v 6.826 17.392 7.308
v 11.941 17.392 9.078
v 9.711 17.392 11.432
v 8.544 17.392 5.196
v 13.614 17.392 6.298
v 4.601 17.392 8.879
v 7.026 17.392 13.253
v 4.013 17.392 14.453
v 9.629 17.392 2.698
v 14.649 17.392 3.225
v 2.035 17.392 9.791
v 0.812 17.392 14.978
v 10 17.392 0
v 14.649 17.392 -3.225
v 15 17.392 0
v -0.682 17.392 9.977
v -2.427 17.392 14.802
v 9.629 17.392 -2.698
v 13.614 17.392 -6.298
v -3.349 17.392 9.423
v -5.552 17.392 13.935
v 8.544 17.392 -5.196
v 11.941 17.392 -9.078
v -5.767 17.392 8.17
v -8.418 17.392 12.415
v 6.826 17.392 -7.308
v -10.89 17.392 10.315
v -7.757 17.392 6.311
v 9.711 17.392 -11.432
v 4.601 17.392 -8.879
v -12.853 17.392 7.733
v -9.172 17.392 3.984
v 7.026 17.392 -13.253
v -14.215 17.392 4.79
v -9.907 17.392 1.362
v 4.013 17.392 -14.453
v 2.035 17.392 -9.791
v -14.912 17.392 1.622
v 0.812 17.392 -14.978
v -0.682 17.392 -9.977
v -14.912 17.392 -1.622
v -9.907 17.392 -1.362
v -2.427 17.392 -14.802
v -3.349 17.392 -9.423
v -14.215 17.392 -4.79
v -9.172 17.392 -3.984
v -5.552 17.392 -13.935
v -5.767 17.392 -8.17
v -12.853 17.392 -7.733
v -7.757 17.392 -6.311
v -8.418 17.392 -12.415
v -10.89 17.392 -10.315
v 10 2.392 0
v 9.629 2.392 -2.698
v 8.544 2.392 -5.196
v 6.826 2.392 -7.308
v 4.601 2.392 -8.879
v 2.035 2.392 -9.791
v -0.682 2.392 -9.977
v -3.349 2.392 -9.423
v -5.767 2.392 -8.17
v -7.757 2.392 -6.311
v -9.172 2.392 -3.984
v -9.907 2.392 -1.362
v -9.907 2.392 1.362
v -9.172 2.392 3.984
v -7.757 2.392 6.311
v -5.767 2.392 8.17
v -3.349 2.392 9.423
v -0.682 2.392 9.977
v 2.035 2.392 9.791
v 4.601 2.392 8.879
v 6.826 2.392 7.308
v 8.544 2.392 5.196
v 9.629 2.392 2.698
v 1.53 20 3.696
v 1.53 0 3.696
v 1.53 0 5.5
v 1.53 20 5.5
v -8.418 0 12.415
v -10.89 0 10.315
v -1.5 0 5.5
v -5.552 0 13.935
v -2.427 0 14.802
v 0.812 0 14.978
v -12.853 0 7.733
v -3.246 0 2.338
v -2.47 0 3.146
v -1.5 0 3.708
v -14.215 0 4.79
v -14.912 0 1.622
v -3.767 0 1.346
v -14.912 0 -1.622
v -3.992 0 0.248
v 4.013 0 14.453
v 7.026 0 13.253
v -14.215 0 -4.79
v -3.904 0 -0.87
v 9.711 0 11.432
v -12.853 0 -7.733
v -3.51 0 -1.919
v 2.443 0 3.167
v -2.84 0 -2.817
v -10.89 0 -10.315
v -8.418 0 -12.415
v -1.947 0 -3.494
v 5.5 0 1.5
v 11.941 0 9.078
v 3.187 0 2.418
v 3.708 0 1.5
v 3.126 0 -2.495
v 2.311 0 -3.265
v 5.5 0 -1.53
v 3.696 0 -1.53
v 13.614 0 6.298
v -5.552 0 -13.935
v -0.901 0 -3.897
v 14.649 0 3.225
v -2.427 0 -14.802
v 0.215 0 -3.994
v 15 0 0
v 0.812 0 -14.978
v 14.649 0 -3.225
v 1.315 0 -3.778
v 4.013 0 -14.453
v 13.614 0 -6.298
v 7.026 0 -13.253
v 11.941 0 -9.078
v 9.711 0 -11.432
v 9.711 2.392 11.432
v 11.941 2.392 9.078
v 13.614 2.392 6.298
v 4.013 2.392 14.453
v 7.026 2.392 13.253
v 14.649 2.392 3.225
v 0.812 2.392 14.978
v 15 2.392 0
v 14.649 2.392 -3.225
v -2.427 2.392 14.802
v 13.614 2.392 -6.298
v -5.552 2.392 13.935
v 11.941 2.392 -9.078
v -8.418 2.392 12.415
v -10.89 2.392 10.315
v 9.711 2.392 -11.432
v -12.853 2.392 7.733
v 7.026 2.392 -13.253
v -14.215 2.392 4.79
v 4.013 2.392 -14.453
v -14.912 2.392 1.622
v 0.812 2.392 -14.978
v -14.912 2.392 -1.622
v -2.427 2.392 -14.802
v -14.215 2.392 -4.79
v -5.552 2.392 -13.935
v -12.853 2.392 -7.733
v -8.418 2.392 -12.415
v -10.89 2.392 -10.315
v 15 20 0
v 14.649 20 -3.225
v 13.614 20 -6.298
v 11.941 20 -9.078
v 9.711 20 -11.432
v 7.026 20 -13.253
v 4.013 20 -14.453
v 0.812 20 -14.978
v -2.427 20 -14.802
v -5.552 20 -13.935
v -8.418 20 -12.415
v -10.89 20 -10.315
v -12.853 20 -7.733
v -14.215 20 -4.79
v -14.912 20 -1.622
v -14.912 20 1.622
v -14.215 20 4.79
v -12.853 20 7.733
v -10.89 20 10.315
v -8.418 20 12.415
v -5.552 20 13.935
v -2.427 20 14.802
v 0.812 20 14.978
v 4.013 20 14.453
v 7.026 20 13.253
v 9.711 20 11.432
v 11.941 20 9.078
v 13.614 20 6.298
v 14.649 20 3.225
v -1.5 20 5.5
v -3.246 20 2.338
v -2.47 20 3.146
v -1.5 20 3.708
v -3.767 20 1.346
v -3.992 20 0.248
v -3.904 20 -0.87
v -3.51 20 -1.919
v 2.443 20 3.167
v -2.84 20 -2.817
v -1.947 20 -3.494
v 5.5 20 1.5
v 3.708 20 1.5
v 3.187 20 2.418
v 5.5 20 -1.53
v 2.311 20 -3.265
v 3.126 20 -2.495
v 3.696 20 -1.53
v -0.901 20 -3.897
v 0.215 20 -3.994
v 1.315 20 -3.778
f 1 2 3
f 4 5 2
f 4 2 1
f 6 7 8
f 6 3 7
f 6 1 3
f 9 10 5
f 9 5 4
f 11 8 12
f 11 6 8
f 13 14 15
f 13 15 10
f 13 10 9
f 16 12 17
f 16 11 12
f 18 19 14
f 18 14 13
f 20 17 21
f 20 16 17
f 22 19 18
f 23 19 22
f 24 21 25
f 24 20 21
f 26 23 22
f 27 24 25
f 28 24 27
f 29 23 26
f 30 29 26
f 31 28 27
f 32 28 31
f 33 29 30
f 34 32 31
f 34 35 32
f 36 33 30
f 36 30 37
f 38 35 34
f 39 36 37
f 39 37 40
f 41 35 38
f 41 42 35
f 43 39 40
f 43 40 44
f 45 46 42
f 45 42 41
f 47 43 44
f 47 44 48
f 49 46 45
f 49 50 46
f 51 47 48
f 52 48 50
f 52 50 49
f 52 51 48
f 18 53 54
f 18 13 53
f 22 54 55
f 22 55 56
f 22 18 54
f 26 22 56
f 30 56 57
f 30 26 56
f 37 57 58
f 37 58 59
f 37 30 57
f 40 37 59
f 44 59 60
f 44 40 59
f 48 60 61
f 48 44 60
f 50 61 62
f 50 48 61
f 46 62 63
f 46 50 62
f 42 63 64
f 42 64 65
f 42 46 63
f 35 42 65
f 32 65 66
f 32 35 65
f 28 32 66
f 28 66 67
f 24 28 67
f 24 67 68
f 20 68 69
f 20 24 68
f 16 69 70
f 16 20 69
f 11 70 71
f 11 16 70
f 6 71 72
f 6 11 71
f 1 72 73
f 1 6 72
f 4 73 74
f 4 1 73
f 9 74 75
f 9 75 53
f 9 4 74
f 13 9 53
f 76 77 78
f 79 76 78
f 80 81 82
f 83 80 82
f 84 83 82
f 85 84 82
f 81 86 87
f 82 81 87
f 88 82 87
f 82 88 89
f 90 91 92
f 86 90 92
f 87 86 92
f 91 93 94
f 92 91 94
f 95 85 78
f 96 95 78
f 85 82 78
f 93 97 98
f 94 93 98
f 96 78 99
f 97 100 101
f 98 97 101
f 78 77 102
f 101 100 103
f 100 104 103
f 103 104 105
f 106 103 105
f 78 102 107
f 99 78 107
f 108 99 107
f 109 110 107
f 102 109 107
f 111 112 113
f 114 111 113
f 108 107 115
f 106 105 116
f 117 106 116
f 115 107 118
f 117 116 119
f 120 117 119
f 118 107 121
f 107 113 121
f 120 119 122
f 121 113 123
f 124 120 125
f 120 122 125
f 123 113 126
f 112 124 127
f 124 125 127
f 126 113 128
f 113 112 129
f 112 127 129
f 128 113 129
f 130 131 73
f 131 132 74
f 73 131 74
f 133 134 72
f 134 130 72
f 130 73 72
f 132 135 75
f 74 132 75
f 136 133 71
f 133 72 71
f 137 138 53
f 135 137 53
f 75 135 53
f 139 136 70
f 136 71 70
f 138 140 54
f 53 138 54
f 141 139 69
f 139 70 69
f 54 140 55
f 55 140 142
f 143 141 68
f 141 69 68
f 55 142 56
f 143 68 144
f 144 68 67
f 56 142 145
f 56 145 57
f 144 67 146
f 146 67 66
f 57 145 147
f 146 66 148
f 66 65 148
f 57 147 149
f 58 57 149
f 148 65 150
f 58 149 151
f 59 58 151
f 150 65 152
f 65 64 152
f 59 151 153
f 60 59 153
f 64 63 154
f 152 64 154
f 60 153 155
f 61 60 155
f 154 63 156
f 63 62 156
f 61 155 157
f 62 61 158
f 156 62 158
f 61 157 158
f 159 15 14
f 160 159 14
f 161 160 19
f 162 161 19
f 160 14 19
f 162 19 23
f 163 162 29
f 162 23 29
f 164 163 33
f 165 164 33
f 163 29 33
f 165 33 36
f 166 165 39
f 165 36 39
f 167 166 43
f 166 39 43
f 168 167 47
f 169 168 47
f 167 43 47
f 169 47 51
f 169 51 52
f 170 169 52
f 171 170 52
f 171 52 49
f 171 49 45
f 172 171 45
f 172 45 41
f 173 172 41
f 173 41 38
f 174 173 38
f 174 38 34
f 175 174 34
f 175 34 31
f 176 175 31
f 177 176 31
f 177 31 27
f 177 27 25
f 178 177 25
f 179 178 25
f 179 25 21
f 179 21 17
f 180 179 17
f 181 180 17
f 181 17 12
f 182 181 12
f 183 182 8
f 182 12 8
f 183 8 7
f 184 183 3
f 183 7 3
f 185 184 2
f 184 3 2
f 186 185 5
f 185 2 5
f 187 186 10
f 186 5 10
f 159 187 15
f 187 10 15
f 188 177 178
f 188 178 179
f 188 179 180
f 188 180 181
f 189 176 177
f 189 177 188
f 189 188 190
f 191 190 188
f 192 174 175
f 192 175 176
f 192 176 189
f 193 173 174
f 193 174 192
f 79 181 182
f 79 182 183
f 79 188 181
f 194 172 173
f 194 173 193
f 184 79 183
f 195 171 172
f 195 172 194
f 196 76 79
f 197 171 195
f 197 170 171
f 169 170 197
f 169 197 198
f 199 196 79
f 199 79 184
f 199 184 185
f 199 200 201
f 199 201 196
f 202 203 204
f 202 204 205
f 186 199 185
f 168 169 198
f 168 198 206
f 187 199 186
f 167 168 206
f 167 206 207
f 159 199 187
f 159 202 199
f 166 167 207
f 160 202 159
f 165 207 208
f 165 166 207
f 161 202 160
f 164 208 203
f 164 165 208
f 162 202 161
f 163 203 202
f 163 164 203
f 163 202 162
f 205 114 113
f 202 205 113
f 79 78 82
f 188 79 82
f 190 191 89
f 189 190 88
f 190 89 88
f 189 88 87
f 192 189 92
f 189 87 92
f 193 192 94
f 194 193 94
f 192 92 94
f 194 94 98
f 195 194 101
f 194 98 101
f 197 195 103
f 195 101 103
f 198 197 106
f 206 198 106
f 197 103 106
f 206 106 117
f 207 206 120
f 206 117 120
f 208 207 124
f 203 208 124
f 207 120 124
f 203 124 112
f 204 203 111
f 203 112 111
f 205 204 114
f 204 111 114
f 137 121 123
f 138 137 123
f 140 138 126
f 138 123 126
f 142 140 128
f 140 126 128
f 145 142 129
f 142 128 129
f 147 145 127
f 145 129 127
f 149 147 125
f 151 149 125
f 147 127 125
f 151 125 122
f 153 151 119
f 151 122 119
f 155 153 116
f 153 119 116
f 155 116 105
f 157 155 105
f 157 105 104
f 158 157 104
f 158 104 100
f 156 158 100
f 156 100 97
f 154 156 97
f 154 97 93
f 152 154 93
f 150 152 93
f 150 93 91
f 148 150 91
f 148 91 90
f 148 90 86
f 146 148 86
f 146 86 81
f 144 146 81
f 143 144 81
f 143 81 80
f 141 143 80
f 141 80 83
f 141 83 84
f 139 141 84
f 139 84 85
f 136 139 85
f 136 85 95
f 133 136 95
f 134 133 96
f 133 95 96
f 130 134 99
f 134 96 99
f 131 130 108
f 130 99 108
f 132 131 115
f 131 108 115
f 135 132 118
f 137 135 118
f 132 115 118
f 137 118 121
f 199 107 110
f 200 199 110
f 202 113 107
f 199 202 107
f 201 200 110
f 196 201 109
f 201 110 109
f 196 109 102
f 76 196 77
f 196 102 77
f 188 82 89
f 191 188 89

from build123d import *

# Parameters (mm, degrees)
SKETCH_1_R      = 15
EXTRUDE_1_DEPTH = 20
SKETCH_2_W      = 5
SKETCH_2_H      = 15


with BuildPart() as part:
    # 草图1 → 凸台-拉伸1 (new body)
    with BuildSketch(Plane(origin=(0, 0, 0), x_dir=(1, 0, 0), z_dir=(0, 1, 0))):
        Circle(SKETCH_1_R)
        with BuildLine():
            Line((1.53, -5.5), (0, -5.5))
            Line((0, -5.5), (-1.5, -5.5))
            Line((-1.5, -5.5), (-1.5, -3.708099244))
            ThreePointArc((-1.5, -3.708099244), (-2.839864336, 2.816943477), (3.695821965, 1.53))
            Line((3.695821965, 1.53), (5.5, 1.53))
            Line((5.5, 1.53), (5.5, 0))
            Line((5.5, 0), (5.5, -1.5))
            Line((5.5, -1.5), (3.708099244, -1.5))
            ThreePointArc((3.708099244, -1.5), (2.839864336, -2.816943477), (1.53, -3.695821965))
            Line((1.53, -3.695821965), (1.53, -5.5))
        make_face(mode=Mode.SUBTRACT)
    extrude(amount=EXTRUDE_1_DEPTH)

    # 草图2 → 切除-旋转1 (revolve, cut)
    with BuildSketch(Plane.XY):
        with Locations((12.5, 9.892021361)):
            Rectangle(SKETCH_2_W, SKETCH_2_H)
    revolve(axis=Axis((0, 0, 0), (0, 1, 0)), mode=Mode.SUBTRACT)


solid = part.part
